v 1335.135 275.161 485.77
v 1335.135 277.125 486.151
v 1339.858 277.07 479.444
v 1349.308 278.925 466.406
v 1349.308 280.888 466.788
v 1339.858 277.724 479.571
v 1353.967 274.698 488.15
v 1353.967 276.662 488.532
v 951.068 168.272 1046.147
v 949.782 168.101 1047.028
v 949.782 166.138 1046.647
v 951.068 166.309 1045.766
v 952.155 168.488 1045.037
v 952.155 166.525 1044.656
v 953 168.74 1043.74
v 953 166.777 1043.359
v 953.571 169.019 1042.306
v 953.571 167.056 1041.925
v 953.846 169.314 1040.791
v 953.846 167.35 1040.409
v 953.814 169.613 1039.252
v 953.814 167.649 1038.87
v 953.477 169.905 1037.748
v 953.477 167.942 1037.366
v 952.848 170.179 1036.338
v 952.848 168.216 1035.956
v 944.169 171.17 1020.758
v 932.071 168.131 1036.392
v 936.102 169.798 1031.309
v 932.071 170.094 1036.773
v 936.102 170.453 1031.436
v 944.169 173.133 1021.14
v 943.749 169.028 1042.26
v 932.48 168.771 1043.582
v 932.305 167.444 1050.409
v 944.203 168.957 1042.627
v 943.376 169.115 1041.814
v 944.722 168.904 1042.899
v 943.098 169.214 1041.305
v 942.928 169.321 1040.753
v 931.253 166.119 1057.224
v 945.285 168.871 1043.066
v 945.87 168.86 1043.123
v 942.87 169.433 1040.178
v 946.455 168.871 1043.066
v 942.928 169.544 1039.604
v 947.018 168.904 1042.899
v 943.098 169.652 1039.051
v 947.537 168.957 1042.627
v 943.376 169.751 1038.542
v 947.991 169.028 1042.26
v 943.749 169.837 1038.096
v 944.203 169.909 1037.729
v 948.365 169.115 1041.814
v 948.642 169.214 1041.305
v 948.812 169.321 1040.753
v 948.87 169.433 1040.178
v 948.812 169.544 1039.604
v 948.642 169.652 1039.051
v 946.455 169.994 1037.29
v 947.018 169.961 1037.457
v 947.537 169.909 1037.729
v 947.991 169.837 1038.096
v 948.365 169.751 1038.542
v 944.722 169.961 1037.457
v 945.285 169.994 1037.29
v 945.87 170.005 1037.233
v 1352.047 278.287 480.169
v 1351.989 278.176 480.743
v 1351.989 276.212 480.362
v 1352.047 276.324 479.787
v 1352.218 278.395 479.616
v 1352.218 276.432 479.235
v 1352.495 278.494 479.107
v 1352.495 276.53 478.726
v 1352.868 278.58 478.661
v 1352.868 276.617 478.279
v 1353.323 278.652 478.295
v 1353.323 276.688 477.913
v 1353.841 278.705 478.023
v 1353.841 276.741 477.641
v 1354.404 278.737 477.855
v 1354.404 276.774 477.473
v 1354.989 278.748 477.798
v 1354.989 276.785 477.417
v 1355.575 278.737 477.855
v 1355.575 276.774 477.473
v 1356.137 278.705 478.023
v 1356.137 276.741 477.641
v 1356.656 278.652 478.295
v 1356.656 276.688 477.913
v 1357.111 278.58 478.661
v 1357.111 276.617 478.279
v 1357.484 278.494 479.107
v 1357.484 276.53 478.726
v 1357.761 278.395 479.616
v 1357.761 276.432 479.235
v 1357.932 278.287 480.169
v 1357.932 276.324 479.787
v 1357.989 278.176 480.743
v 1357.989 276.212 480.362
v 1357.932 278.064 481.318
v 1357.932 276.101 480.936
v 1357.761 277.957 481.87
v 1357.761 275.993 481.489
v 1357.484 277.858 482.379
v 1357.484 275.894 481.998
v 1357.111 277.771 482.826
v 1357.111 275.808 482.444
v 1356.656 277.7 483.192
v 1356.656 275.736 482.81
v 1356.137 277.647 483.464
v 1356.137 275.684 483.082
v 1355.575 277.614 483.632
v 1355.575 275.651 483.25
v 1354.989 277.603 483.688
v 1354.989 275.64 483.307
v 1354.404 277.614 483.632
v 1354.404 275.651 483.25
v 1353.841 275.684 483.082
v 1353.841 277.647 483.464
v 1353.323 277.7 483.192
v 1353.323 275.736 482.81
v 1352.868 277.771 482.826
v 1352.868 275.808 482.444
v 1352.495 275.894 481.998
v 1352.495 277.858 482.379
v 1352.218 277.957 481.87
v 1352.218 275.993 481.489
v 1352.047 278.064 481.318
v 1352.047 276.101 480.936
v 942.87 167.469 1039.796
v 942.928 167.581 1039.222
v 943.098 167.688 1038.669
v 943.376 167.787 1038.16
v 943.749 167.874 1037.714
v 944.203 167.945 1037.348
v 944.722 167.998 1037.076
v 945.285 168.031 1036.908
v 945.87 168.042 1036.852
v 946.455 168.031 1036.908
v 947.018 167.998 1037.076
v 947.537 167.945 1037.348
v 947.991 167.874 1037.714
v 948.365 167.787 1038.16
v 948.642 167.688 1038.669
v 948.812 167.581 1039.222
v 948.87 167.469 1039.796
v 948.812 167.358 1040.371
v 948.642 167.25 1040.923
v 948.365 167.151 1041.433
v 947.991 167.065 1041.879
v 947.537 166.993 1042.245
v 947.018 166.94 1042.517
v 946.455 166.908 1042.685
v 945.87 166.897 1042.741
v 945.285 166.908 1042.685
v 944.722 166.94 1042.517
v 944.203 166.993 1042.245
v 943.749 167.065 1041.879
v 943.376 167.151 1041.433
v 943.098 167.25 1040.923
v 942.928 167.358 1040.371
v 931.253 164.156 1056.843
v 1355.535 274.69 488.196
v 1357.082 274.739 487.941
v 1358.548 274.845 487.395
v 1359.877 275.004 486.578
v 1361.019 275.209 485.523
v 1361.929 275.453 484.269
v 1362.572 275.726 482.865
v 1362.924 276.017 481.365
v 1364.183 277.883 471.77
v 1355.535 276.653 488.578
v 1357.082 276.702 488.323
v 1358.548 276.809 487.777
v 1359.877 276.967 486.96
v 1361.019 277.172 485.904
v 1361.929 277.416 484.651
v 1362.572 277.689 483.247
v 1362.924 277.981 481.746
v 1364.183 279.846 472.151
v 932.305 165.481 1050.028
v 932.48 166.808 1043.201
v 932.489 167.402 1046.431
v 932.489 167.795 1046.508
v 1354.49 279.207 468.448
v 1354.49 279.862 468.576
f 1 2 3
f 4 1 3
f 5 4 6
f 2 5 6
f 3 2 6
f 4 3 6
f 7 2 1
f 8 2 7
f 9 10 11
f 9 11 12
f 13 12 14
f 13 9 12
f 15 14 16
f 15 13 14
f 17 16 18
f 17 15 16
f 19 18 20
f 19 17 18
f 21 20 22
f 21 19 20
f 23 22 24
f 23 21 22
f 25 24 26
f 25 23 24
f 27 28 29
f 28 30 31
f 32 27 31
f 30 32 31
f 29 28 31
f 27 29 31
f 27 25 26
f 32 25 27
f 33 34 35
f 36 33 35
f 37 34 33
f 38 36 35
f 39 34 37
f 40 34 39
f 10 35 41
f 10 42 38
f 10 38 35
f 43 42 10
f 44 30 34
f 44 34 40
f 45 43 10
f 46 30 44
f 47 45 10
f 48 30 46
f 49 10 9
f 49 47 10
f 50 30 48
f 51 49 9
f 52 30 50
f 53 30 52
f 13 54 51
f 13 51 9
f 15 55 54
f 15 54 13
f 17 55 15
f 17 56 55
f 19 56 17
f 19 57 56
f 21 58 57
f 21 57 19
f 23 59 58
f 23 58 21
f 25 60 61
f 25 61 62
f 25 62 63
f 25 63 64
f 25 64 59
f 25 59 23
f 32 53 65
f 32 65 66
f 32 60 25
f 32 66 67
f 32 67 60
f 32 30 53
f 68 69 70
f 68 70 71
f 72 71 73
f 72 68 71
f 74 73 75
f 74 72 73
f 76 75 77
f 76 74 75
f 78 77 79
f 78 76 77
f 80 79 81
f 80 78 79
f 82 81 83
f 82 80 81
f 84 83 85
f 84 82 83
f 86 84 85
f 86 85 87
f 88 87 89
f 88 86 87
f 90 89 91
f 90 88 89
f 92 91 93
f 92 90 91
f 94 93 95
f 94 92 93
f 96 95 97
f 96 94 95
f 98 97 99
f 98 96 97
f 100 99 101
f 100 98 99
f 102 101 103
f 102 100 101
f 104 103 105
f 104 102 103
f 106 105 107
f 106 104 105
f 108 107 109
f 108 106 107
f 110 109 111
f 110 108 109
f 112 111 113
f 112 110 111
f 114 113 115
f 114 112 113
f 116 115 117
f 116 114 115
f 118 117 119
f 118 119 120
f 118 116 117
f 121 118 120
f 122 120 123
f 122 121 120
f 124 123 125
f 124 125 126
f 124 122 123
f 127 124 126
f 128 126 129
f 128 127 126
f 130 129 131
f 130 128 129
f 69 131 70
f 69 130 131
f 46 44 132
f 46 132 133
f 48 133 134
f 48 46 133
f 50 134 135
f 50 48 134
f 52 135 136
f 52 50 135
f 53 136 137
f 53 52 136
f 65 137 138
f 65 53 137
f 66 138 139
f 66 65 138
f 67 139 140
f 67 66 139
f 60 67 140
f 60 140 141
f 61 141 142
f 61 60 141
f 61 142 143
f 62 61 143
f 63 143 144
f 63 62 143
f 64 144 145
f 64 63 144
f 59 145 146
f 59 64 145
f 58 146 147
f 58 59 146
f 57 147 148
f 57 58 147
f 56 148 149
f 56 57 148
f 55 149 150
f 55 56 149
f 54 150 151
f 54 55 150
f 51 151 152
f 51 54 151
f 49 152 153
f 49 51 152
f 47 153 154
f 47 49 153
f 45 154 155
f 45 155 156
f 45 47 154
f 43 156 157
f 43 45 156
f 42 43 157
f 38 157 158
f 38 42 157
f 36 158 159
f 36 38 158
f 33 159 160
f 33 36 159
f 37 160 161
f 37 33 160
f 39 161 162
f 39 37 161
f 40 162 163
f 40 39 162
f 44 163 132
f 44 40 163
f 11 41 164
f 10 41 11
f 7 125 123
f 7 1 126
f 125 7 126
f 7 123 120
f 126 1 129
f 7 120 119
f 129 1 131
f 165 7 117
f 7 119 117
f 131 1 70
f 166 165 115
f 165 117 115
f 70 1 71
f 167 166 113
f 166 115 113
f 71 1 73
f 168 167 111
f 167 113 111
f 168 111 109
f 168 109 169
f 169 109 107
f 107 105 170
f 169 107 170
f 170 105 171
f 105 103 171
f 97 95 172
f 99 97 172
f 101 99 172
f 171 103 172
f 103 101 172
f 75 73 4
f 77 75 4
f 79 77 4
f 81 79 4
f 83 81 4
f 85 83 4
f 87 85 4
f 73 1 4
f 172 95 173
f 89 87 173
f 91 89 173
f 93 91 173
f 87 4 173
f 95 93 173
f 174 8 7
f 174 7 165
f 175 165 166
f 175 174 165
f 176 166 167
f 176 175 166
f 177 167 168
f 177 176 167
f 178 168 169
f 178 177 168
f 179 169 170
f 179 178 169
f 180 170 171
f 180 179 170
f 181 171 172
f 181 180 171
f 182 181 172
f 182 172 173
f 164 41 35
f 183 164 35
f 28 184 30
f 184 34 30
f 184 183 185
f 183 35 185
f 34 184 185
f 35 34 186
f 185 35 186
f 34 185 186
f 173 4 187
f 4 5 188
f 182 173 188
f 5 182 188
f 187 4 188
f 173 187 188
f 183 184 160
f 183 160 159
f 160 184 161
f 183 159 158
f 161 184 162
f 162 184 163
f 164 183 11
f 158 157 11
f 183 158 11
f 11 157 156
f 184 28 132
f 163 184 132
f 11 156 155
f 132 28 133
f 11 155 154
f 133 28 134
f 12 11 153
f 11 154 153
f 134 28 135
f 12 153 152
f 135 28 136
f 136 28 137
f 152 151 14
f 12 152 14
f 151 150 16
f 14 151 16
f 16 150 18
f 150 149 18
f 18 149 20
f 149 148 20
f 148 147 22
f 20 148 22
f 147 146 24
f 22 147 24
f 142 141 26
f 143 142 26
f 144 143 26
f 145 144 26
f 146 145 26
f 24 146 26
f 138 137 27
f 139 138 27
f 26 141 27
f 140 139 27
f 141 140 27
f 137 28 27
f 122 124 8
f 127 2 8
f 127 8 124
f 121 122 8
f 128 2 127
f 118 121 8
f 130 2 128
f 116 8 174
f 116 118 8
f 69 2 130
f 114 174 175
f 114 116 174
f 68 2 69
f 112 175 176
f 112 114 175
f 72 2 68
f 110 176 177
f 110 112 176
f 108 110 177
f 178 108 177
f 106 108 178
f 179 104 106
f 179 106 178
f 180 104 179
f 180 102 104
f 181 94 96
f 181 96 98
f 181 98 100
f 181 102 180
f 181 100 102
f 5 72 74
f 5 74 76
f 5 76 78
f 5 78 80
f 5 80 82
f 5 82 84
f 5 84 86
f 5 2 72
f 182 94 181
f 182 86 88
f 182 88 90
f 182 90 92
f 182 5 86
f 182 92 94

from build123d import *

# Parameters (mm, degrees)
SZKIC1_R                      = 3
DODANIE_WYCI_GNI_CIE1_DEPTH   = 2
DODANIE_WYCI_GNI_CIE1_2_DEPTH = 2


with BuildPart() as part:
    # Szkic1 → Dodanie-wyciągnięcie1 (new body)
    with BuildSketch(Plane(origin=(0, 358.092671711, 69.606164227), x_dir=(-1, 0, 0), z_dir=(0, -0.981627183, -0.190808995))):
        with BuildLine():
            Line((-1362.923797729, -419.854107682), (-1364.182603001, -410.079521535))
            add(Edge.make_bspline(
                [(-1349.308104441, -404.615300263), (-1354.327109709, -406.530701132), (-1359.305192252, -408.355661256), (-1364.182603001, -410.079521535)],
                knots=[0.918491709, 0.918491709, 0.918491709, 0.918491709, 1, 1, 1, 1], degree=3, weights=[0.850940189, 0.896217531, 0.945904135, 1]))
            add(Edge.make_bspline(
                [(-1335.135312752, -424.341477666), (-1339.857721526, -417.768694868), (-1344.581988379, -411.193298285), (-1349.308104441, -404.615300263)],
                knots=[0.966451554, 0.966451554, 0.966451554, 0.966451554, 1, 1, 1, 1], degree=3, weights=[0.999946517, 0.999963726, 0.999981554, 1]))
            Line((-1335.135312752, -424.341477666), (-1353.967495394, -426.766751785))
            ThreePointArc((-1353.967495394, -426.766751785), (-1359.877302031, -425.165340681), (-1362.923797729, -419.854107682))
        make_face()
        with Locations((-1354.98932451, -418.832278566)):
            Circle(SZKIC1_R, mode=Mode.SUBTRACT)
    extrude(amount=DODANIE_WYCI_GNI_CIE1_DEPTH)


with BuildPart() as body_2:
    # Szkic1 → Dodanie-wyci_gni_cie1 2 (new body)
    with BuildSketch(Plane(origin=(0, 358.092671711, 69.606164227), x_dir=(-1, 0, 0), z_dir=(0, -0.981627183, -0.190808995))):
        with BuildLine():
            Line((-952.848375327, -984.825791702), (-944.168784695, -969.343088606))
            add(Edge.make_bspline(
                [(-932.070864738, -985.269178293), (-936.101696367, -979.962881902), (-940.134338111, -974.654183026), (-944.168784695, -969.343088606)],
                knots=[0, 0, 0, 0, 0.028373338, 0.028373338, 0.028373338, 0.028373338], degree=3, weights=[1, 0.999984399, 0.999969241, 0.999954525]))
            add(Edge.make_bspline(
                [(-931.253435448, -1006.103231509), (-931.346908095, -1005.707936087), (-931.433937079, -1005.310748901), (-931.730758065, -1003.851080189), (-931.904919365, -1002.774169083), (-932.317793571, -999.550369722), (-932.450892162, -997.405576031), (-932.526546788, -993.121894403), (-932.467876959, -990.983044462), (-932.271293947, -987.653301408), (-932.179682868, -986.460973189), (-932.070864738, -985.269178293)],
                knots=[0.038995217, 0.038995217, 0.038995217, 0.038995217, 0.0625, 0.0625, 0.125, 0.125, 0.25, 0.25, 0.375, 0.375, 0.444789397, 0.444789397, 0.444789397, 0.444789397], degree=3))
            Line((-931.253435448, -1006.103231509), (-949.782119992, -995.71606618))
            ThreePointArc((-949.782119992, -995.71606618), (-953.570697353, -990.905971214), (-952.848375327, -984.825791702))
        make_face()
        with Locations((-945.87011042, -988.737801274)):
            Circle(SZKIC1_R, mode=Mode.SUBTRACT)
    extrude(amount=DODANIE_WYCI_GNI_CIE1_2_DEPTH)


solid = Compound([part.part, body_2.part])
